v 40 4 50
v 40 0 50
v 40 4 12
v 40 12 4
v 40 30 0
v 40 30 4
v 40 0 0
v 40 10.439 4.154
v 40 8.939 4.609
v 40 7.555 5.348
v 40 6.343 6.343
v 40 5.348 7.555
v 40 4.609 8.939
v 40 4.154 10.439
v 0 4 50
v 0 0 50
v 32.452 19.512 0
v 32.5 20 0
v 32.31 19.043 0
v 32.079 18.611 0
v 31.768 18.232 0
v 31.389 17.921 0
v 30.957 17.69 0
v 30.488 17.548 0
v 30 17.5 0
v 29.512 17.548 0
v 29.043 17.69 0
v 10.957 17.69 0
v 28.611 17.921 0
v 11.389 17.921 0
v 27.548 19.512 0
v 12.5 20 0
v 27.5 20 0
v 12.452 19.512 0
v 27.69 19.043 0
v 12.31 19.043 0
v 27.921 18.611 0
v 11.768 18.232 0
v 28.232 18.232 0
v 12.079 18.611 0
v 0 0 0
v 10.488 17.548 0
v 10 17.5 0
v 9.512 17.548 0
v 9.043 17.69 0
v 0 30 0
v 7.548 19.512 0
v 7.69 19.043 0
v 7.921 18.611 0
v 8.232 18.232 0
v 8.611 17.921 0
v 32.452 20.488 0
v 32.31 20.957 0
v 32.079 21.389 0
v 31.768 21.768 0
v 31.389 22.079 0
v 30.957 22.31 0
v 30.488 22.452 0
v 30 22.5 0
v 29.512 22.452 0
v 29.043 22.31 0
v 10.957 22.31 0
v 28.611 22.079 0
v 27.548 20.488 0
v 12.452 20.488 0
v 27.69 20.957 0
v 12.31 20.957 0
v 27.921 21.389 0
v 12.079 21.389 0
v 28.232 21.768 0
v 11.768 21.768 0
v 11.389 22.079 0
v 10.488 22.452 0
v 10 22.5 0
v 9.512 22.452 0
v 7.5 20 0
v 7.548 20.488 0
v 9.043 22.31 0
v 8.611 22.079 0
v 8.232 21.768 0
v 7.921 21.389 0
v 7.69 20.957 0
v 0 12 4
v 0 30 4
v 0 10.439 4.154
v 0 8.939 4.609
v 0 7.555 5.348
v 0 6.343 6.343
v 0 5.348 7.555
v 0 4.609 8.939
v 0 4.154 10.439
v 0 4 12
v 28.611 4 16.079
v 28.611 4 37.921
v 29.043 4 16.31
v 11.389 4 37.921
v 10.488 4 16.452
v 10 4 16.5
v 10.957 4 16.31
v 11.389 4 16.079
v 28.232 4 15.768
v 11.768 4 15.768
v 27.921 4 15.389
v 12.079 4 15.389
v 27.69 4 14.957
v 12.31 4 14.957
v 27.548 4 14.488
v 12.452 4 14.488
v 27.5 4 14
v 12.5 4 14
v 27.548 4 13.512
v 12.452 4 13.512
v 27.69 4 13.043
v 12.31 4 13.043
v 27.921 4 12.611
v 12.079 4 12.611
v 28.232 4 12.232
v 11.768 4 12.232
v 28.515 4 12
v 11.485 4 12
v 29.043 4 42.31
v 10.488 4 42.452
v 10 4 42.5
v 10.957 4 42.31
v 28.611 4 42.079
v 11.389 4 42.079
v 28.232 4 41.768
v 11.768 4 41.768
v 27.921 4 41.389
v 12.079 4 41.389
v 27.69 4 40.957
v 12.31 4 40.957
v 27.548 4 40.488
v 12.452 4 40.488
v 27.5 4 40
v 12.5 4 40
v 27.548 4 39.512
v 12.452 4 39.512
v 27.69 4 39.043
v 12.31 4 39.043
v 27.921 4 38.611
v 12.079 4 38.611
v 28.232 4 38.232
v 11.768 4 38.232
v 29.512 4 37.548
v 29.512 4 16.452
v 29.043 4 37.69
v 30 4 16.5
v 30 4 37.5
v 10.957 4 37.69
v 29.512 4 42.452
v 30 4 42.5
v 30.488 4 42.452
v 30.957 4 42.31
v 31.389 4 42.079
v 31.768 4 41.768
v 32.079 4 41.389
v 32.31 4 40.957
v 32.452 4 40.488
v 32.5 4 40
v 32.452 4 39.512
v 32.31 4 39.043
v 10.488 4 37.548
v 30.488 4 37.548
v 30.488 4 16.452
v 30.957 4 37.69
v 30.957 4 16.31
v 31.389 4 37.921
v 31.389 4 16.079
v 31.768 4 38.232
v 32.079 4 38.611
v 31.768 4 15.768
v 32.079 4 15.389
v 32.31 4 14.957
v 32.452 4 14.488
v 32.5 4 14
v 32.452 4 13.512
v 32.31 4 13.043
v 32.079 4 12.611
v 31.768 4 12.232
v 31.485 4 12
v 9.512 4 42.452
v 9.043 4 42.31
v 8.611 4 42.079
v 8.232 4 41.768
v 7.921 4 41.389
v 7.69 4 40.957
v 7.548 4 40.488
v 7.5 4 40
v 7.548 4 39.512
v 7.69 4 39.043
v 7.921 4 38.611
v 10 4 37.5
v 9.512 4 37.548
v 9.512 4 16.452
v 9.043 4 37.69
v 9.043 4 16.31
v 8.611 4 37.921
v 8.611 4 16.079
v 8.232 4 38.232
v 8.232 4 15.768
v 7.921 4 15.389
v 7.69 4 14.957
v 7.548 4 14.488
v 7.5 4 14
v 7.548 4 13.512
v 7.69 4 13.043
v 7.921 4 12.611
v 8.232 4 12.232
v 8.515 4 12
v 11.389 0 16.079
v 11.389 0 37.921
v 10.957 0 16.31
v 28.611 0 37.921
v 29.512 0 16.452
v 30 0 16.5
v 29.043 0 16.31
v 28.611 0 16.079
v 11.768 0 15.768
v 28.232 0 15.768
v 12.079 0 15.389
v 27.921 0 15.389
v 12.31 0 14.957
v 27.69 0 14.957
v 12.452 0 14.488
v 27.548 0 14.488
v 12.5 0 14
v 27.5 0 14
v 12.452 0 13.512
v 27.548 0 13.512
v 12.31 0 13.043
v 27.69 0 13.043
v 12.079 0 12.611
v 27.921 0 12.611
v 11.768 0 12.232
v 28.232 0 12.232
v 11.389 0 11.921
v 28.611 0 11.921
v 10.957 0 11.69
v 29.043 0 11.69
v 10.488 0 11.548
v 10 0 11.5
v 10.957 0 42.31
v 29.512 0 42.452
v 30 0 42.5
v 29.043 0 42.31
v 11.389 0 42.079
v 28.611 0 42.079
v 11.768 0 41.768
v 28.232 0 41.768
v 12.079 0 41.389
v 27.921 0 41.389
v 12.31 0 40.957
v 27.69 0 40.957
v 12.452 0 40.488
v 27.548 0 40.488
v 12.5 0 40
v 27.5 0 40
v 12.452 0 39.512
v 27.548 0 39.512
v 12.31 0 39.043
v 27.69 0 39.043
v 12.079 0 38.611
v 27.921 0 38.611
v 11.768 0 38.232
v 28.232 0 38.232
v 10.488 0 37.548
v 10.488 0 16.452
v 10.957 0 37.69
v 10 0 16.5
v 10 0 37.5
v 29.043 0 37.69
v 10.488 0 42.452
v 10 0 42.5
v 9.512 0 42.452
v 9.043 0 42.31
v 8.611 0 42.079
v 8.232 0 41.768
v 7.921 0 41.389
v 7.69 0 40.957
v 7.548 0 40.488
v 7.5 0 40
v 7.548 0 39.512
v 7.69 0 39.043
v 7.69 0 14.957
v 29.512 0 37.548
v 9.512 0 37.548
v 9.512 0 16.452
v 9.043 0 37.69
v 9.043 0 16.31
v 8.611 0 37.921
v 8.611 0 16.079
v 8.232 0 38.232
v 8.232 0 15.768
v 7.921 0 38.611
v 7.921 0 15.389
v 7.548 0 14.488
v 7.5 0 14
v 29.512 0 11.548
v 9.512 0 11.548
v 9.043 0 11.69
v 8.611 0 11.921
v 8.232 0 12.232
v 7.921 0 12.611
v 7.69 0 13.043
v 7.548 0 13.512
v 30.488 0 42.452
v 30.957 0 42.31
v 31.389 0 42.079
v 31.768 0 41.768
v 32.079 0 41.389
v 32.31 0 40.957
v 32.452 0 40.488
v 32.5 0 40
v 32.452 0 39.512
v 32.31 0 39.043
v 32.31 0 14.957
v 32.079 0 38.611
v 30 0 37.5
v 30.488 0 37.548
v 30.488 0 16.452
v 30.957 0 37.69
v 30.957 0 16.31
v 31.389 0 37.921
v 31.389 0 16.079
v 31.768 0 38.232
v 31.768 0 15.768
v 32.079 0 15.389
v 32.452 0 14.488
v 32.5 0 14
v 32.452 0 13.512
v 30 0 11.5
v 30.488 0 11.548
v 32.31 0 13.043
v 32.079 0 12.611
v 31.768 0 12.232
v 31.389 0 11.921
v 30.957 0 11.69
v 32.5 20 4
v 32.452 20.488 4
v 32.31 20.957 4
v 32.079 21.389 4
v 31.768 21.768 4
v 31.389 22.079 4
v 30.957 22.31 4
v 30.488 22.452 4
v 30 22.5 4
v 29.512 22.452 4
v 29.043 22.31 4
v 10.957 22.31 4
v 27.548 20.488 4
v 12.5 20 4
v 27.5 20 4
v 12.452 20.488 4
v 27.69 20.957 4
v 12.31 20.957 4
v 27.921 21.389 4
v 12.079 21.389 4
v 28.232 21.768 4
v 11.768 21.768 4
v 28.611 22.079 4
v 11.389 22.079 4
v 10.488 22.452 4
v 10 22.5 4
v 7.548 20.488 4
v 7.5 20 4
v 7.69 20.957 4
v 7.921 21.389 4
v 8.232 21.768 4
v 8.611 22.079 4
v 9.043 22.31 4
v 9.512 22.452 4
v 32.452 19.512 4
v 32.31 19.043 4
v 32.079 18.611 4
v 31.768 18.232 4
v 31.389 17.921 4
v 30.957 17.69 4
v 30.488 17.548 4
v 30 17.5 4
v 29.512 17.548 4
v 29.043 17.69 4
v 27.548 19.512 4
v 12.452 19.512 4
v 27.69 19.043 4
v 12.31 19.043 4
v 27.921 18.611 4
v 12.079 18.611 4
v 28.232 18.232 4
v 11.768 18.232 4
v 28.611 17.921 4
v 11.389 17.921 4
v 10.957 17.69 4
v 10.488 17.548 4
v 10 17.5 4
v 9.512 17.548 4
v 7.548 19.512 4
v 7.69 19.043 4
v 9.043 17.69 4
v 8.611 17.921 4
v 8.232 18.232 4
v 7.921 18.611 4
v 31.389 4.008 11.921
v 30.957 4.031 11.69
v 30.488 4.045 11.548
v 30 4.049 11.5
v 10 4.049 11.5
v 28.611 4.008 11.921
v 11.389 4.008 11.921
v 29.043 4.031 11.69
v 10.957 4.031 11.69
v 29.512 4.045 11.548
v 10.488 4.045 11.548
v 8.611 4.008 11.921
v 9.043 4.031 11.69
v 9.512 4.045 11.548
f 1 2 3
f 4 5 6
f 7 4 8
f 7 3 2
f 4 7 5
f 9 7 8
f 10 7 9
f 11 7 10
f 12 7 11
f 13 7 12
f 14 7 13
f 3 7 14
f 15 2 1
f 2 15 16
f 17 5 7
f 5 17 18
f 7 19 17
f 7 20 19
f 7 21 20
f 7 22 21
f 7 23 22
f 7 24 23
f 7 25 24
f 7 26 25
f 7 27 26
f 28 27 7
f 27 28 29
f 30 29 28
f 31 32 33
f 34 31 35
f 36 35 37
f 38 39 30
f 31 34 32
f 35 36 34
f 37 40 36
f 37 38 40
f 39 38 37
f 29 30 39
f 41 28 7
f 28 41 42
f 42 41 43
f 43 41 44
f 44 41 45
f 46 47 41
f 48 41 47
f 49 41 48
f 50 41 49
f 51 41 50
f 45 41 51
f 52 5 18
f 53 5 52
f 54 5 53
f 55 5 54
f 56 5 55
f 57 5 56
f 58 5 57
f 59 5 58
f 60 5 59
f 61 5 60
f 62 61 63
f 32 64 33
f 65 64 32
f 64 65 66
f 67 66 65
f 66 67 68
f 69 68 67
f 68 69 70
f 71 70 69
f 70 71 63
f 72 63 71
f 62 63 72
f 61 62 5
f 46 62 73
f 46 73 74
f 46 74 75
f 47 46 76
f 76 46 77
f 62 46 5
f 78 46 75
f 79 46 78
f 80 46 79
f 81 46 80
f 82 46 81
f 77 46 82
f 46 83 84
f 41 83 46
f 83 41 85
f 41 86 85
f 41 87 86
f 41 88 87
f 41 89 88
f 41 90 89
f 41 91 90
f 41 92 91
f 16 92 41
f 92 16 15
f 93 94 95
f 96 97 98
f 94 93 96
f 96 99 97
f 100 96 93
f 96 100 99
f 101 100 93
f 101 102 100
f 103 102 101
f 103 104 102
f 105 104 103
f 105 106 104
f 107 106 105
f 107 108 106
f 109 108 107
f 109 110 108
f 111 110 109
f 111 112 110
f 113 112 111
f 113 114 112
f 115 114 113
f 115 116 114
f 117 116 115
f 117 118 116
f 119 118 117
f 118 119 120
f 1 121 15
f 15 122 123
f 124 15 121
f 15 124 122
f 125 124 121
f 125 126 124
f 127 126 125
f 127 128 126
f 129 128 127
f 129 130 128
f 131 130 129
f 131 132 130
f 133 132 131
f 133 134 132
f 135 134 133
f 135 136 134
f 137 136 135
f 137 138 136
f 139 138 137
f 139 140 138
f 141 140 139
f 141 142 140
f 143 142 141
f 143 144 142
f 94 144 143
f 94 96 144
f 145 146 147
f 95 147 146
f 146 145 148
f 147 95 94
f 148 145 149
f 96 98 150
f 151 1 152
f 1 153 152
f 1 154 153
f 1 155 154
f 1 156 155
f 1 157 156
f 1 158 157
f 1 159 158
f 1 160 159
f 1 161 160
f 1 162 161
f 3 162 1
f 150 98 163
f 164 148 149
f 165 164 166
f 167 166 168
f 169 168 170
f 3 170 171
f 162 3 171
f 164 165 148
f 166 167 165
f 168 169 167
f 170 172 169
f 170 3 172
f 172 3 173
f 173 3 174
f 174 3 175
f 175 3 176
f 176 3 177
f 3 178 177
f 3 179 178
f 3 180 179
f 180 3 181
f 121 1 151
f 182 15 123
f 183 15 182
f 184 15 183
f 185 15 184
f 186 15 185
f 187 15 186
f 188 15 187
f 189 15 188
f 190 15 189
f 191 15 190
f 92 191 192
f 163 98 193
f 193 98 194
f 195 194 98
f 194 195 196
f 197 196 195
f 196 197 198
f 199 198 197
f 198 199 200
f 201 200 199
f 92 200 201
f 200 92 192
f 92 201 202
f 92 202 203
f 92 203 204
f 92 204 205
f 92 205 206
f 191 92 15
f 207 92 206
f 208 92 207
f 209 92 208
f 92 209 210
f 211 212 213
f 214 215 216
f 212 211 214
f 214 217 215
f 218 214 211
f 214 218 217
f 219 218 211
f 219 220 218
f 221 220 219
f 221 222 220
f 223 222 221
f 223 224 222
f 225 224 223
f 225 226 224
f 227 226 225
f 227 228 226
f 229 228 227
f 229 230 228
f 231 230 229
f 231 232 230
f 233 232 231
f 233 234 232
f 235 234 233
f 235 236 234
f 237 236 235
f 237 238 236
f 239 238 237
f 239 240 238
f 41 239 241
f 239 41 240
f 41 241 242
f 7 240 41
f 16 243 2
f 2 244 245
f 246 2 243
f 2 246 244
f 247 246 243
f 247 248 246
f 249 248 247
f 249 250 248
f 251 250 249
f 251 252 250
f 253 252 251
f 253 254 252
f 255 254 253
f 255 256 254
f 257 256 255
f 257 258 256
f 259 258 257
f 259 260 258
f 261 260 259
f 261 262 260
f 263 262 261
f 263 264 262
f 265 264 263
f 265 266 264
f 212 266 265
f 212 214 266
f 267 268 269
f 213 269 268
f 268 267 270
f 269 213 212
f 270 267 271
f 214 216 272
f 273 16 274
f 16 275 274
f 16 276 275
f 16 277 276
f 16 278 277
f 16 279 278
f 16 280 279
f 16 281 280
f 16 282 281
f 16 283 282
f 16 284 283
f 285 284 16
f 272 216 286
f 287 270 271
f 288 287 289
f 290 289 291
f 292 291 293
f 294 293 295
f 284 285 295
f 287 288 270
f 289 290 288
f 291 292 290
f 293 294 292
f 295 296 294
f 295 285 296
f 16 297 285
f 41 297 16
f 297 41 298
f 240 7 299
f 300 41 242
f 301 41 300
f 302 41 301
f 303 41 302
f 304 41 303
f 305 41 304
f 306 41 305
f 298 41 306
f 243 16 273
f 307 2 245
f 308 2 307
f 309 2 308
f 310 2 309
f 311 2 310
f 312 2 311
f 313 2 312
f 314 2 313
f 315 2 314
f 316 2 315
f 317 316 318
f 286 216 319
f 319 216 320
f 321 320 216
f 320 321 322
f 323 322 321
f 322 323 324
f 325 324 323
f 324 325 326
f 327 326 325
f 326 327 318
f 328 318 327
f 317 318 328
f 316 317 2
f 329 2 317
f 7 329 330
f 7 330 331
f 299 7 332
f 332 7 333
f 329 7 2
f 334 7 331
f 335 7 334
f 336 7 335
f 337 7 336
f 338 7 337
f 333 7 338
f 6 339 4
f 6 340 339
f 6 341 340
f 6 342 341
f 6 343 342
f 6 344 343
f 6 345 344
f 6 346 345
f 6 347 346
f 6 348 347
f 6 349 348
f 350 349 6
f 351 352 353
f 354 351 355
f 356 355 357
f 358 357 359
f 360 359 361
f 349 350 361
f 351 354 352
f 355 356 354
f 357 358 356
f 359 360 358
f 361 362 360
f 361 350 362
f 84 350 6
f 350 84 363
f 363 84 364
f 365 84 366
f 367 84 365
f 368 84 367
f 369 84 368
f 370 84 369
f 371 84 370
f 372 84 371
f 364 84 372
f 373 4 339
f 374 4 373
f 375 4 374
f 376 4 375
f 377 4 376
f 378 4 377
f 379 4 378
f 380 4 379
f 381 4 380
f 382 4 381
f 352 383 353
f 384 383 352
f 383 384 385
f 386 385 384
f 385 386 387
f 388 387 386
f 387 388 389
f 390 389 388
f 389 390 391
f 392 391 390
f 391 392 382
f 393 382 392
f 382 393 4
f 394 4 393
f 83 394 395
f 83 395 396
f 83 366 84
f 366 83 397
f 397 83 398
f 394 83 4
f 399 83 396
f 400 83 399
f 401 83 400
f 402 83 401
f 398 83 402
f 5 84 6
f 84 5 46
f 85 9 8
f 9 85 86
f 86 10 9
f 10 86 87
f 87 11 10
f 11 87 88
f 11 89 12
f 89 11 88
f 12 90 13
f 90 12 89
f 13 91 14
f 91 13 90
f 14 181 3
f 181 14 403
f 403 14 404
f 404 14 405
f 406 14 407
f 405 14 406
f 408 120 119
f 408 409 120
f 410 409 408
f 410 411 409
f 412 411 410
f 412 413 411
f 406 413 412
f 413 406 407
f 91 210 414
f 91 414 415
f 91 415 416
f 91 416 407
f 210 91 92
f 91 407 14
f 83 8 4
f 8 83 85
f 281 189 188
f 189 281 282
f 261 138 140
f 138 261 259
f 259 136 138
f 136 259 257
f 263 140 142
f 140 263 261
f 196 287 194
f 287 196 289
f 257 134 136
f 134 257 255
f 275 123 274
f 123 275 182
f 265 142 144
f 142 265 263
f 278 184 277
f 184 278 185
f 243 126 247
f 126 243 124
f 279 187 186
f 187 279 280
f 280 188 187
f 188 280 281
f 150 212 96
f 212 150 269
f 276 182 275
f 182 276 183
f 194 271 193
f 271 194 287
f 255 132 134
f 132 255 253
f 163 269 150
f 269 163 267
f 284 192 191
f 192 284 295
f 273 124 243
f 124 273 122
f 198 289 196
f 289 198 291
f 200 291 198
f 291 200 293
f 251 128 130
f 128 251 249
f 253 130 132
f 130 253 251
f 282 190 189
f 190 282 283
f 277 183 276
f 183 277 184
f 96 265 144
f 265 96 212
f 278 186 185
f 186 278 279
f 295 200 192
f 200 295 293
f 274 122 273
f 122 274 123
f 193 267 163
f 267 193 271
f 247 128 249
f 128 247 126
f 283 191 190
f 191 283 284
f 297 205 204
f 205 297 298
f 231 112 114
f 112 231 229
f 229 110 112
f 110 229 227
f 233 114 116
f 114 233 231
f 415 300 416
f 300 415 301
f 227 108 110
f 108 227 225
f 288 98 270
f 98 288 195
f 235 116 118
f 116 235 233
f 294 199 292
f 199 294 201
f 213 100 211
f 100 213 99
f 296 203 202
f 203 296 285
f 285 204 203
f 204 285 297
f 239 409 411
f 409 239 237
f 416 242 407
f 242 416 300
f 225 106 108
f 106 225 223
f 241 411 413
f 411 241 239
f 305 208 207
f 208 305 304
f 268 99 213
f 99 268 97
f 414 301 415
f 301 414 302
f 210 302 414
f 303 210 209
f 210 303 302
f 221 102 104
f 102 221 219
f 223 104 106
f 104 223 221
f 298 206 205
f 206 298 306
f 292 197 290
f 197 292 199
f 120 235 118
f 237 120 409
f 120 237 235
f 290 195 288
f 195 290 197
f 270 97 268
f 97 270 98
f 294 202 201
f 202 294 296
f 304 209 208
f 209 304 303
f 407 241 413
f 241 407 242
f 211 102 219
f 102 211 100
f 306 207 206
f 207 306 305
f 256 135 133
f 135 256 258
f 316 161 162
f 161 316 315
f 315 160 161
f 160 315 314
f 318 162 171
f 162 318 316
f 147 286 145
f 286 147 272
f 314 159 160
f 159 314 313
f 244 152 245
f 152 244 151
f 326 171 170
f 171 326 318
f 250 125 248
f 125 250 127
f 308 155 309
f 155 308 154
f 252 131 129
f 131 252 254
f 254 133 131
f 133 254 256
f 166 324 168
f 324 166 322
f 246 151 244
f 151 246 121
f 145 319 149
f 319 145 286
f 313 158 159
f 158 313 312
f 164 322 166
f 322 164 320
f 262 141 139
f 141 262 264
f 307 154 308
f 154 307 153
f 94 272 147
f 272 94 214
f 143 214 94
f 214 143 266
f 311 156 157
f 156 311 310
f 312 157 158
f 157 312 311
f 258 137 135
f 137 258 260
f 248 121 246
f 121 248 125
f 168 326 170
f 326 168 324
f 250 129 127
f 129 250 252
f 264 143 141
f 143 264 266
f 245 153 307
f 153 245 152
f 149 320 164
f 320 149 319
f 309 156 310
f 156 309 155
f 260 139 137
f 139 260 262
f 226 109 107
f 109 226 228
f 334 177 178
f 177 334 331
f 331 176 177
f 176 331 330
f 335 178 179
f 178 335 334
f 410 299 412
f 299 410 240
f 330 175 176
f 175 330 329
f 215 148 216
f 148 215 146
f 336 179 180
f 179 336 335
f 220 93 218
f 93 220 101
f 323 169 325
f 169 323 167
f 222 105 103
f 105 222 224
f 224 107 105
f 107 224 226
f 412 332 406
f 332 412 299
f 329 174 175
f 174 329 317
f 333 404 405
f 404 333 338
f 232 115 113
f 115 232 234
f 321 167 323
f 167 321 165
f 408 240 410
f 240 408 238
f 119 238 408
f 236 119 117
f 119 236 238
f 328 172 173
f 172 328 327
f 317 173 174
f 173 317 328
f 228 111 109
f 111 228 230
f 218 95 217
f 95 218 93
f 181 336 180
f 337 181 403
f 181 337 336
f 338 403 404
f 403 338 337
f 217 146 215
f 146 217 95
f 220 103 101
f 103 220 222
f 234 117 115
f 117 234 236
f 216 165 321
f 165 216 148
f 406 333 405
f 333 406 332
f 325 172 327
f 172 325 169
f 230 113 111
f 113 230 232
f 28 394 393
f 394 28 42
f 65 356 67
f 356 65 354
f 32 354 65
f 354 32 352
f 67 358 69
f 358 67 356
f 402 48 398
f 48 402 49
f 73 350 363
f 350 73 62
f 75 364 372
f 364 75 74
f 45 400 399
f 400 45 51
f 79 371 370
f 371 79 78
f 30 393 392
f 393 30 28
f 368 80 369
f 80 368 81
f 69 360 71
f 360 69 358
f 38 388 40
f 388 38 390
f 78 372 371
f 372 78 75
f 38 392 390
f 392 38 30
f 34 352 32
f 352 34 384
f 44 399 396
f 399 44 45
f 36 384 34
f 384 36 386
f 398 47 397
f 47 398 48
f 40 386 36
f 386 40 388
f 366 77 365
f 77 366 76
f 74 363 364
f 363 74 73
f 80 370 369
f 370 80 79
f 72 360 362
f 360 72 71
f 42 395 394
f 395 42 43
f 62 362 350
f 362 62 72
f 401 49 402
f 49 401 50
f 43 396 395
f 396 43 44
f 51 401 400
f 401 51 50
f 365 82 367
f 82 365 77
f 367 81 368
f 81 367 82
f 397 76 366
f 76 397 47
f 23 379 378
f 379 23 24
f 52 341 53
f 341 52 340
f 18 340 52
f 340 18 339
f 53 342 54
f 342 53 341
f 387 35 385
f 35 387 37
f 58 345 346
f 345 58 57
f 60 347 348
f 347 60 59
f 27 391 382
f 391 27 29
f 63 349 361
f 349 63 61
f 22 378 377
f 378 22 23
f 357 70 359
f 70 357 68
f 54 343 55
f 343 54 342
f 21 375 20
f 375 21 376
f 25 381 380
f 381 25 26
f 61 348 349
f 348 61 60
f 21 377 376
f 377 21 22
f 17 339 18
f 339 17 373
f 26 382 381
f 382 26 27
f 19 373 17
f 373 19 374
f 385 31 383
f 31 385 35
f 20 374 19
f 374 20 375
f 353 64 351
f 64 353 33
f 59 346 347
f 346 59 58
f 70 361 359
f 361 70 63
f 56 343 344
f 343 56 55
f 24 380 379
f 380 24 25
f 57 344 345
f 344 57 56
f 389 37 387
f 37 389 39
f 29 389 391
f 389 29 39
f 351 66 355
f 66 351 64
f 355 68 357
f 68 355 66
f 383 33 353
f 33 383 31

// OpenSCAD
// Parametric L-bracket with mounting holes
// Includes fillets for strength

bracket_width = 40;
bracket_height = 50;
bracket_depth = 30;
thickness = 4;
hole_diameter = 5;
hole_margin = 10;
fillet_radius = 8;

$fn = 32;

module fillet_2d(r) {
    difference() {
        square([r, r]);
        translate([r, r])
        circle(r=r);
    }
}

module l_bracket() {
    difference() {
        union() {
            // Vertical plate
            cube([bracket_width, thickness, bracket_height]);
            
            // Horizontal plate
            cube([bracket_width, bracket_depth, thickness]);
            
            // Fillet/gusset for strength
            translate([0, thickness, thickness])
            rotate([90, 0, 90])
            linear_extrude(height=bracket_width)
            difference() {
                square([fillet_radius, fillet_radius]);
                translate([fillet_radius, fillet_radius])
                circle(r=fillet_radius);
            }
        }
        
        // Vertical mounting holes
        for (x = [hole_margin, bracket_width - hole_margin]) {
            translate([x, -1, bracket_height - hole_margin])
            rotate([-90, 0, 0])
            cylinder(d=hole_diameter, h=thickness + 2);
            
            translate([x, -1, hole_margin + thickness])
            rotate([-90, 0, 0])
            cylinder(d=hole_diameter, h=thickness + 2);
        }
        
        // Horizontal mounting holes
        for (x = [hole_margin, bracket_width - hole_margin]) {
            translate([x, bracket_depth - hole_margin, -1])
            cylinder(d=hole_diameter, h=thickness + 2);
        }
    }
}

l_bracket();
